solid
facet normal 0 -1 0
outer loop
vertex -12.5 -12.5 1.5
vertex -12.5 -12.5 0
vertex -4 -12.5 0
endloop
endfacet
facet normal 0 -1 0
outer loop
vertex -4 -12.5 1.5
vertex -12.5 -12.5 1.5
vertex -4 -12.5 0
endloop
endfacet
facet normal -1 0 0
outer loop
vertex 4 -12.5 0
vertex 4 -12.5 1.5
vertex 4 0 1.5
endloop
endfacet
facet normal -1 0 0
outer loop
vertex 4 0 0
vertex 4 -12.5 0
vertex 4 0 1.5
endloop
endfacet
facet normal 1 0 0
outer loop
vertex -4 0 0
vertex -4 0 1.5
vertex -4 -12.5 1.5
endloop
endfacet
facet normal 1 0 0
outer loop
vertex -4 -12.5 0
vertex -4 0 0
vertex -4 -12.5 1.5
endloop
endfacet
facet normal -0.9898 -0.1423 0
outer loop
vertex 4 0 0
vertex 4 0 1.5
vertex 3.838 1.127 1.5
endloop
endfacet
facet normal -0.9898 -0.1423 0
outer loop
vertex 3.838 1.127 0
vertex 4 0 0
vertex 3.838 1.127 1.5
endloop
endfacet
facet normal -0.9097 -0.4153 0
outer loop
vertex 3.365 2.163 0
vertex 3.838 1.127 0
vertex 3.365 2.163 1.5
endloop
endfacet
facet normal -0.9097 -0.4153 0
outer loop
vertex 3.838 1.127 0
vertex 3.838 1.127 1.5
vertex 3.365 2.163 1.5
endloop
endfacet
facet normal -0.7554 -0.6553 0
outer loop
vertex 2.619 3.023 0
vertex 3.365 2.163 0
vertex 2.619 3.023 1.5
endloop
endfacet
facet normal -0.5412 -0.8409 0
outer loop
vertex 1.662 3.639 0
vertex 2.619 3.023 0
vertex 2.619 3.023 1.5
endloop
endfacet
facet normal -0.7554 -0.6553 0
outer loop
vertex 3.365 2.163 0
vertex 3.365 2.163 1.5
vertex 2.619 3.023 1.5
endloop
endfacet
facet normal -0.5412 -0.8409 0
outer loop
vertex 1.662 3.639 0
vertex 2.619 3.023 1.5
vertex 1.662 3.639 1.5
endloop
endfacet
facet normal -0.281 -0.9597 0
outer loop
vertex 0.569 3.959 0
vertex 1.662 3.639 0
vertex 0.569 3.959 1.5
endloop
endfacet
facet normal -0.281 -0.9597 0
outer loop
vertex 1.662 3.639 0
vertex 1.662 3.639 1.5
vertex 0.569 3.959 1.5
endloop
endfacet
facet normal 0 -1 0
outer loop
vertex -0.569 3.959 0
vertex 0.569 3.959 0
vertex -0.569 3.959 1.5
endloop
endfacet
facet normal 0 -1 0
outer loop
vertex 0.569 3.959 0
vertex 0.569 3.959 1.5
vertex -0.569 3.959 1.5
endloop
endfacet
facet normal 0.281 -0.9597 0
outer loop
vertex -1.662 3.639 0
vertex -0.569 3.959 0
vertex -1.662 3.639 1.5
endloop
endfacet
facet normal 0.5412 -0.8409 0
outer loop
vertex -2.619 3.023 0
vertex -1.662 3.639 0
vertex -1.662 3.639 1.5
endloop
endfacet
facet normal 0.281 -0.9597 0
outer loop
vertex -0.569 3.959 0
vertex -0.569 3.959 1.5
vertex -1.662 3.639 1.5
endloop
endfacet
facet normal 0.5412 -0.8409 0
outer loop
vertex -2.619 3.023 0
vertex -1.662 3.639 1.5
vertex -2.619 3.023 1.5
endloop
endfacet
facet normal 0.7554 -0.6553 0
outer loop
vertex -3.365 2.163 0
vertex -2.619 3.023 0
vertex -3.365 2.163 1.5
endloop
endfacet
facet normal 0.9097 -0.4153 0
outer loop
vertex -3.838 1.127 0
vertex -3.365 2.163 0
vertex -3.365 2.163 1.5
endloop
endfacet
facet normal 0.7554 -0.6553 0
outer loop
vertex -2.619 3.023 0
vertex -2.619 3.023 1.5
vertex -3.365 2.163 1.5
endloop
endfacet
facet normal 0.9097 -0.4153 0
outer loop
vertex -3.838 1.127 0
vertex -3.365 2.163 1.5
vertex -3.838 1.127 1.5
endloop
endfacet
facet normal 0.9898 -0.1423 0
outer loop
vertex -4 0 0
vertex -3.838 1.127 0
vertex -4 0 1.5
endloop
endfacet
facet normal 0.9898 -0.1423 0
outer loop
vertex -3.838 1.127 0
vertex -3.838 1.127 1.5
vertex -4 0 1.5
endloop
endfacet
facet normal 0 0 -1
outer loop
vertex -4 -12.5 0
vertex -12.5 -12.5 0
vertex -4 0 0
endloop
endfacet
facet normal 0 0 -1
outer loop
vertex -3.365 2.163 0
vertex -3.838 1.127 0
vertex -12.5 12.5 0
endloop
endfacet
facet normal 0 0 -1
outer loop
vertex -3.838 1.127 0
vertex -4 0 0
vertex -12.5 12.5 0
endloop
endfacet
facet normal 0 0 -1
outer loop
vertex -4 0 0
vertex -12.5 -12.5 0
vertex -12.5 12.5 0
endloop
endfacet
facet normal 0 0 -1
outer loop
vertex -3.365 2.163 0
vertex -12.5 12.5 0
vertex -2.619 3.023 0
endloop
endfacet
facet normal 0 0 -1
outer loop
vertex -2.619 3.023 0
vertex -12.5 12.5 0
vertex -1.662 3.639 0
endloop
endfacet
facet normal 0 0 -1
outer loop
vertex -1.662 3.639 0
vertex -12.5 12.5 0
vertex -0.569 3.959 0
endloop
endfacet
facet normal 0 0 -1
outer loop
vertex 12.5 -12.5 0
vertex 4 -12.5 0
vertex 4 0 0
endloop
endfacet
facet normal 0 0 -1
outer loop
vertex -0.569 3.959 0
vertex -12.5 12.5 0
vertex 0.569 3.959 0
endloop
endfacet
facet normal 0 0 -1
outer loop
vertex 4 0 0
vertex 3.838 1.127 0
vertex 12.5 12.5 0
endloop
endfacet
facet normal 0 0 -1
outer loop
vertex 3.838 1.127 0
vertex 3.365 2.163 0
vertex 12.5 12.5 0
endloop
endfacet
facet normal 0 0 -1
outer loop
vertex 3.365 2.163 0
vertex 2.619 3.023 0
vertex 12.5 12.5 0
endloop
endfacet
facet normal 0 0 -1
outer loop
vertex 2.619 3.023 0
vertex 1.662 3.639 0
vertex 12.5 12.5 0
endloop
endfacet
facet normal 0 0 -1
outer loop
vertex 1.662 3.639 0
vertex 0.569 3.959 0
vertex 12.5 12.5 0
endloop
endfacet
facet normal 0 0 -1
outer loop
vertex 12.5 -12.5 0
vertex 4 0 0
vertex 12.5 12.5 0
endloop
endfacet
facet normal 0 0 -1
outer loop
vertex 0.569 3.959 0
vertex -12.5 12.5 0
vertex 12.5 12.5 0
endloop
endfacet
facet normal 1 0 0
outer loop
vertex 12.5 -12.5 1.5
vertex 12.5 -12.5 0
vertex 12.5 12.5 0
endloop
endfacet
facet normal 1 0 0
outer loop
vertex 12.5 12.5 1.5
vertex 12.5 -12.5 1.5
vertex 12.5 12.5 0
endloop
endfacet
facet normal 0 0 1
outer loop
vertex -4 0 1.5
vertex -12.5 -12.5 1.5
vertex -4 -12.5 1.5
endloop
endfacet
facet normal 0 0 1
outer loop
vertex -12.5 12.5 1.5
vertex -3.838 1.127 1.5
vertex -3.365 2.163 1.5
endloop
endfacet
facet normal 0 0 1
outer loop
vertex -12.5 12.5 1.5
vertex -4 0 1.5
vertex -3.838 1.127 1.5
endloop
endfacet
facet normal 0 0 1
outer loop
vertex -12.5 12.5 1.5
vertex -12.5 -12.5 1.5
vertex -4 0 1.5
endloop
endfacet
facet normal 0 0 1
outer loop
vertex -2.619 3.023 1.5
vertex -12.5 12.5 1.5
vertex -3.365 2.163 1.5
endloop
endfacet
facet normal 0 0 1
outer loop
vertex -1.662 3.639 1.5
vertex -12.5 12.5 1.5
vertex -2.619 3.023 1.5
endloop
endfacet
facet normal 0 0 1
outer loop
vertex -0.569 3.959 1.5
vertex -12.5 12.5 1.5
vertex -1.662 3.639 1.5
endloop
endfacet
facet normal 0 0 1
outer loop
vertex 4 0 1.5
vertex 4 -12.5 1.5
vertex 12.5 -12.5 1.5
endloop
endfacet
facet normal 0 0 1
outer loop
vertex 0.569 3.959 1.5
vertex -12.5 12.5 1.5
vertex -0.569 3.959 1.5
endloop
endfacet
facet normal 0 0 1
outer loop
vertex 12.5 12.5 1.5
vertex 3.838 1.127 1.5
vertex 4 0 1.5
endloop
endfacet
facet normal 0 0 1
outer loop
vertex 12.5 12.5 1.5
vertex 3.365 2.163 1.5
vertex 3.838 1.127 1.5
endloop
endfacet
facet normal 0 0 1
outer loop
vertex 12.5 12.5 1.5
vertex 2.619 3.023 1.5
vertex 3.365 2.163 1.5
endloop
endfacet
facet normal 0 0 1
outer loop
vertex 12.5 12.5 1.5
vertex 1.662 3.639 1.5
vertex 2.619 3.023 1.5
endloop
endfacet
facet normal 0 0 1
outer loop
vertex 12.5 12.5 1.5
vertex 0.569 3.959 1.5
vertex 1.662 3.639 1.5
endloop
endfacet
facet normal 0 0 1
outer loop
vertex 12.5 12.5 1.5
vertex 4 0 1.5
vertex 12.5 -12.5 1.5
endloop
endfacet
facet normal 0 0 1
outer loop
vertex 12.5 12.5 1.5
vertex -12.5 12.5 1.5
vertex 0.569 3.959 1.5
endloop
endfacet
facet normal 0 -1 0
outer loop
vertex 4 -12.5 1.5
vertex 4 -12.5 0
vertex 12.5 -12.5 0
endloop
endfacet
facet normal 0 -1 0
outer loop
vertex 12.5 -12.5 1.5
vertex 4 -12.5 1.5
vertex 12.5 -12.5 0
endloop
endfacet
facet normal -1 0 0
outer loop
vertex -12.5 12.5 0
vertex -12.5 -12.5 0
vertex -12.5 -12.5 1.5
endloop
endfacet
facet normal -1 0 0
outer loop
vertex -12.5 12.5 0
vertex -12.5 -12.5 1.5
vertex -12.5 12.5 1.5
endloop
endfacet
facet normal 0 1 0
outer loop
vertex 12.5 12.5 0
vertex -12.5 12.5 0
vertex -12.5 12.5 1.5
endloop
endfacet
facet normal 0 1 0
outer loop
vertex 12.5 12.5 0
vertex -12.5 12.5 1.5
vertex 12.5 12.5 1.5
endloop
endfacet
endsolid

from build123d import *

# Parameters (mm, degrees)
SCHIZZO1_W                   = 25
SCHIZZO1_H                   = 25
ESTRUSIONE_ESTRUSIONE1_DEPTH = 1.5
TAGLIO_ESTRUSIONE1_DEPTH     = 18.741194999


with BuildPart() as part:
    # Schizzo1 → Estrusione-Estrusione1 (new body)
    with BuildSketch(Plane.XY):
        Rectangle(SCHIZZO1_W, SCHIZZO1_H)
    extrude(amount=ESTRUSIONE_ESTRUSIONE1_DEPTH)

    # Schizzo2 → Taglio-Estrusione1 (cut, through all)
    with BuildSketch(Plane.XY.offset(1.5)):
        with BuildLine():
            Line((-4, 0), (-4, -12.5))
            Line((-4, -12.5), (4, -12.5))
            Line((4, -12.5), (4, 0))
            ThreePointArc((4, 0), (0, 4), (-4, 0))
        make_face()
    extrude(amount=-TAGLIO_ESTRUSIONE1_DEPTH, mode=Mode.SUBTRACT)


solid = part.part
